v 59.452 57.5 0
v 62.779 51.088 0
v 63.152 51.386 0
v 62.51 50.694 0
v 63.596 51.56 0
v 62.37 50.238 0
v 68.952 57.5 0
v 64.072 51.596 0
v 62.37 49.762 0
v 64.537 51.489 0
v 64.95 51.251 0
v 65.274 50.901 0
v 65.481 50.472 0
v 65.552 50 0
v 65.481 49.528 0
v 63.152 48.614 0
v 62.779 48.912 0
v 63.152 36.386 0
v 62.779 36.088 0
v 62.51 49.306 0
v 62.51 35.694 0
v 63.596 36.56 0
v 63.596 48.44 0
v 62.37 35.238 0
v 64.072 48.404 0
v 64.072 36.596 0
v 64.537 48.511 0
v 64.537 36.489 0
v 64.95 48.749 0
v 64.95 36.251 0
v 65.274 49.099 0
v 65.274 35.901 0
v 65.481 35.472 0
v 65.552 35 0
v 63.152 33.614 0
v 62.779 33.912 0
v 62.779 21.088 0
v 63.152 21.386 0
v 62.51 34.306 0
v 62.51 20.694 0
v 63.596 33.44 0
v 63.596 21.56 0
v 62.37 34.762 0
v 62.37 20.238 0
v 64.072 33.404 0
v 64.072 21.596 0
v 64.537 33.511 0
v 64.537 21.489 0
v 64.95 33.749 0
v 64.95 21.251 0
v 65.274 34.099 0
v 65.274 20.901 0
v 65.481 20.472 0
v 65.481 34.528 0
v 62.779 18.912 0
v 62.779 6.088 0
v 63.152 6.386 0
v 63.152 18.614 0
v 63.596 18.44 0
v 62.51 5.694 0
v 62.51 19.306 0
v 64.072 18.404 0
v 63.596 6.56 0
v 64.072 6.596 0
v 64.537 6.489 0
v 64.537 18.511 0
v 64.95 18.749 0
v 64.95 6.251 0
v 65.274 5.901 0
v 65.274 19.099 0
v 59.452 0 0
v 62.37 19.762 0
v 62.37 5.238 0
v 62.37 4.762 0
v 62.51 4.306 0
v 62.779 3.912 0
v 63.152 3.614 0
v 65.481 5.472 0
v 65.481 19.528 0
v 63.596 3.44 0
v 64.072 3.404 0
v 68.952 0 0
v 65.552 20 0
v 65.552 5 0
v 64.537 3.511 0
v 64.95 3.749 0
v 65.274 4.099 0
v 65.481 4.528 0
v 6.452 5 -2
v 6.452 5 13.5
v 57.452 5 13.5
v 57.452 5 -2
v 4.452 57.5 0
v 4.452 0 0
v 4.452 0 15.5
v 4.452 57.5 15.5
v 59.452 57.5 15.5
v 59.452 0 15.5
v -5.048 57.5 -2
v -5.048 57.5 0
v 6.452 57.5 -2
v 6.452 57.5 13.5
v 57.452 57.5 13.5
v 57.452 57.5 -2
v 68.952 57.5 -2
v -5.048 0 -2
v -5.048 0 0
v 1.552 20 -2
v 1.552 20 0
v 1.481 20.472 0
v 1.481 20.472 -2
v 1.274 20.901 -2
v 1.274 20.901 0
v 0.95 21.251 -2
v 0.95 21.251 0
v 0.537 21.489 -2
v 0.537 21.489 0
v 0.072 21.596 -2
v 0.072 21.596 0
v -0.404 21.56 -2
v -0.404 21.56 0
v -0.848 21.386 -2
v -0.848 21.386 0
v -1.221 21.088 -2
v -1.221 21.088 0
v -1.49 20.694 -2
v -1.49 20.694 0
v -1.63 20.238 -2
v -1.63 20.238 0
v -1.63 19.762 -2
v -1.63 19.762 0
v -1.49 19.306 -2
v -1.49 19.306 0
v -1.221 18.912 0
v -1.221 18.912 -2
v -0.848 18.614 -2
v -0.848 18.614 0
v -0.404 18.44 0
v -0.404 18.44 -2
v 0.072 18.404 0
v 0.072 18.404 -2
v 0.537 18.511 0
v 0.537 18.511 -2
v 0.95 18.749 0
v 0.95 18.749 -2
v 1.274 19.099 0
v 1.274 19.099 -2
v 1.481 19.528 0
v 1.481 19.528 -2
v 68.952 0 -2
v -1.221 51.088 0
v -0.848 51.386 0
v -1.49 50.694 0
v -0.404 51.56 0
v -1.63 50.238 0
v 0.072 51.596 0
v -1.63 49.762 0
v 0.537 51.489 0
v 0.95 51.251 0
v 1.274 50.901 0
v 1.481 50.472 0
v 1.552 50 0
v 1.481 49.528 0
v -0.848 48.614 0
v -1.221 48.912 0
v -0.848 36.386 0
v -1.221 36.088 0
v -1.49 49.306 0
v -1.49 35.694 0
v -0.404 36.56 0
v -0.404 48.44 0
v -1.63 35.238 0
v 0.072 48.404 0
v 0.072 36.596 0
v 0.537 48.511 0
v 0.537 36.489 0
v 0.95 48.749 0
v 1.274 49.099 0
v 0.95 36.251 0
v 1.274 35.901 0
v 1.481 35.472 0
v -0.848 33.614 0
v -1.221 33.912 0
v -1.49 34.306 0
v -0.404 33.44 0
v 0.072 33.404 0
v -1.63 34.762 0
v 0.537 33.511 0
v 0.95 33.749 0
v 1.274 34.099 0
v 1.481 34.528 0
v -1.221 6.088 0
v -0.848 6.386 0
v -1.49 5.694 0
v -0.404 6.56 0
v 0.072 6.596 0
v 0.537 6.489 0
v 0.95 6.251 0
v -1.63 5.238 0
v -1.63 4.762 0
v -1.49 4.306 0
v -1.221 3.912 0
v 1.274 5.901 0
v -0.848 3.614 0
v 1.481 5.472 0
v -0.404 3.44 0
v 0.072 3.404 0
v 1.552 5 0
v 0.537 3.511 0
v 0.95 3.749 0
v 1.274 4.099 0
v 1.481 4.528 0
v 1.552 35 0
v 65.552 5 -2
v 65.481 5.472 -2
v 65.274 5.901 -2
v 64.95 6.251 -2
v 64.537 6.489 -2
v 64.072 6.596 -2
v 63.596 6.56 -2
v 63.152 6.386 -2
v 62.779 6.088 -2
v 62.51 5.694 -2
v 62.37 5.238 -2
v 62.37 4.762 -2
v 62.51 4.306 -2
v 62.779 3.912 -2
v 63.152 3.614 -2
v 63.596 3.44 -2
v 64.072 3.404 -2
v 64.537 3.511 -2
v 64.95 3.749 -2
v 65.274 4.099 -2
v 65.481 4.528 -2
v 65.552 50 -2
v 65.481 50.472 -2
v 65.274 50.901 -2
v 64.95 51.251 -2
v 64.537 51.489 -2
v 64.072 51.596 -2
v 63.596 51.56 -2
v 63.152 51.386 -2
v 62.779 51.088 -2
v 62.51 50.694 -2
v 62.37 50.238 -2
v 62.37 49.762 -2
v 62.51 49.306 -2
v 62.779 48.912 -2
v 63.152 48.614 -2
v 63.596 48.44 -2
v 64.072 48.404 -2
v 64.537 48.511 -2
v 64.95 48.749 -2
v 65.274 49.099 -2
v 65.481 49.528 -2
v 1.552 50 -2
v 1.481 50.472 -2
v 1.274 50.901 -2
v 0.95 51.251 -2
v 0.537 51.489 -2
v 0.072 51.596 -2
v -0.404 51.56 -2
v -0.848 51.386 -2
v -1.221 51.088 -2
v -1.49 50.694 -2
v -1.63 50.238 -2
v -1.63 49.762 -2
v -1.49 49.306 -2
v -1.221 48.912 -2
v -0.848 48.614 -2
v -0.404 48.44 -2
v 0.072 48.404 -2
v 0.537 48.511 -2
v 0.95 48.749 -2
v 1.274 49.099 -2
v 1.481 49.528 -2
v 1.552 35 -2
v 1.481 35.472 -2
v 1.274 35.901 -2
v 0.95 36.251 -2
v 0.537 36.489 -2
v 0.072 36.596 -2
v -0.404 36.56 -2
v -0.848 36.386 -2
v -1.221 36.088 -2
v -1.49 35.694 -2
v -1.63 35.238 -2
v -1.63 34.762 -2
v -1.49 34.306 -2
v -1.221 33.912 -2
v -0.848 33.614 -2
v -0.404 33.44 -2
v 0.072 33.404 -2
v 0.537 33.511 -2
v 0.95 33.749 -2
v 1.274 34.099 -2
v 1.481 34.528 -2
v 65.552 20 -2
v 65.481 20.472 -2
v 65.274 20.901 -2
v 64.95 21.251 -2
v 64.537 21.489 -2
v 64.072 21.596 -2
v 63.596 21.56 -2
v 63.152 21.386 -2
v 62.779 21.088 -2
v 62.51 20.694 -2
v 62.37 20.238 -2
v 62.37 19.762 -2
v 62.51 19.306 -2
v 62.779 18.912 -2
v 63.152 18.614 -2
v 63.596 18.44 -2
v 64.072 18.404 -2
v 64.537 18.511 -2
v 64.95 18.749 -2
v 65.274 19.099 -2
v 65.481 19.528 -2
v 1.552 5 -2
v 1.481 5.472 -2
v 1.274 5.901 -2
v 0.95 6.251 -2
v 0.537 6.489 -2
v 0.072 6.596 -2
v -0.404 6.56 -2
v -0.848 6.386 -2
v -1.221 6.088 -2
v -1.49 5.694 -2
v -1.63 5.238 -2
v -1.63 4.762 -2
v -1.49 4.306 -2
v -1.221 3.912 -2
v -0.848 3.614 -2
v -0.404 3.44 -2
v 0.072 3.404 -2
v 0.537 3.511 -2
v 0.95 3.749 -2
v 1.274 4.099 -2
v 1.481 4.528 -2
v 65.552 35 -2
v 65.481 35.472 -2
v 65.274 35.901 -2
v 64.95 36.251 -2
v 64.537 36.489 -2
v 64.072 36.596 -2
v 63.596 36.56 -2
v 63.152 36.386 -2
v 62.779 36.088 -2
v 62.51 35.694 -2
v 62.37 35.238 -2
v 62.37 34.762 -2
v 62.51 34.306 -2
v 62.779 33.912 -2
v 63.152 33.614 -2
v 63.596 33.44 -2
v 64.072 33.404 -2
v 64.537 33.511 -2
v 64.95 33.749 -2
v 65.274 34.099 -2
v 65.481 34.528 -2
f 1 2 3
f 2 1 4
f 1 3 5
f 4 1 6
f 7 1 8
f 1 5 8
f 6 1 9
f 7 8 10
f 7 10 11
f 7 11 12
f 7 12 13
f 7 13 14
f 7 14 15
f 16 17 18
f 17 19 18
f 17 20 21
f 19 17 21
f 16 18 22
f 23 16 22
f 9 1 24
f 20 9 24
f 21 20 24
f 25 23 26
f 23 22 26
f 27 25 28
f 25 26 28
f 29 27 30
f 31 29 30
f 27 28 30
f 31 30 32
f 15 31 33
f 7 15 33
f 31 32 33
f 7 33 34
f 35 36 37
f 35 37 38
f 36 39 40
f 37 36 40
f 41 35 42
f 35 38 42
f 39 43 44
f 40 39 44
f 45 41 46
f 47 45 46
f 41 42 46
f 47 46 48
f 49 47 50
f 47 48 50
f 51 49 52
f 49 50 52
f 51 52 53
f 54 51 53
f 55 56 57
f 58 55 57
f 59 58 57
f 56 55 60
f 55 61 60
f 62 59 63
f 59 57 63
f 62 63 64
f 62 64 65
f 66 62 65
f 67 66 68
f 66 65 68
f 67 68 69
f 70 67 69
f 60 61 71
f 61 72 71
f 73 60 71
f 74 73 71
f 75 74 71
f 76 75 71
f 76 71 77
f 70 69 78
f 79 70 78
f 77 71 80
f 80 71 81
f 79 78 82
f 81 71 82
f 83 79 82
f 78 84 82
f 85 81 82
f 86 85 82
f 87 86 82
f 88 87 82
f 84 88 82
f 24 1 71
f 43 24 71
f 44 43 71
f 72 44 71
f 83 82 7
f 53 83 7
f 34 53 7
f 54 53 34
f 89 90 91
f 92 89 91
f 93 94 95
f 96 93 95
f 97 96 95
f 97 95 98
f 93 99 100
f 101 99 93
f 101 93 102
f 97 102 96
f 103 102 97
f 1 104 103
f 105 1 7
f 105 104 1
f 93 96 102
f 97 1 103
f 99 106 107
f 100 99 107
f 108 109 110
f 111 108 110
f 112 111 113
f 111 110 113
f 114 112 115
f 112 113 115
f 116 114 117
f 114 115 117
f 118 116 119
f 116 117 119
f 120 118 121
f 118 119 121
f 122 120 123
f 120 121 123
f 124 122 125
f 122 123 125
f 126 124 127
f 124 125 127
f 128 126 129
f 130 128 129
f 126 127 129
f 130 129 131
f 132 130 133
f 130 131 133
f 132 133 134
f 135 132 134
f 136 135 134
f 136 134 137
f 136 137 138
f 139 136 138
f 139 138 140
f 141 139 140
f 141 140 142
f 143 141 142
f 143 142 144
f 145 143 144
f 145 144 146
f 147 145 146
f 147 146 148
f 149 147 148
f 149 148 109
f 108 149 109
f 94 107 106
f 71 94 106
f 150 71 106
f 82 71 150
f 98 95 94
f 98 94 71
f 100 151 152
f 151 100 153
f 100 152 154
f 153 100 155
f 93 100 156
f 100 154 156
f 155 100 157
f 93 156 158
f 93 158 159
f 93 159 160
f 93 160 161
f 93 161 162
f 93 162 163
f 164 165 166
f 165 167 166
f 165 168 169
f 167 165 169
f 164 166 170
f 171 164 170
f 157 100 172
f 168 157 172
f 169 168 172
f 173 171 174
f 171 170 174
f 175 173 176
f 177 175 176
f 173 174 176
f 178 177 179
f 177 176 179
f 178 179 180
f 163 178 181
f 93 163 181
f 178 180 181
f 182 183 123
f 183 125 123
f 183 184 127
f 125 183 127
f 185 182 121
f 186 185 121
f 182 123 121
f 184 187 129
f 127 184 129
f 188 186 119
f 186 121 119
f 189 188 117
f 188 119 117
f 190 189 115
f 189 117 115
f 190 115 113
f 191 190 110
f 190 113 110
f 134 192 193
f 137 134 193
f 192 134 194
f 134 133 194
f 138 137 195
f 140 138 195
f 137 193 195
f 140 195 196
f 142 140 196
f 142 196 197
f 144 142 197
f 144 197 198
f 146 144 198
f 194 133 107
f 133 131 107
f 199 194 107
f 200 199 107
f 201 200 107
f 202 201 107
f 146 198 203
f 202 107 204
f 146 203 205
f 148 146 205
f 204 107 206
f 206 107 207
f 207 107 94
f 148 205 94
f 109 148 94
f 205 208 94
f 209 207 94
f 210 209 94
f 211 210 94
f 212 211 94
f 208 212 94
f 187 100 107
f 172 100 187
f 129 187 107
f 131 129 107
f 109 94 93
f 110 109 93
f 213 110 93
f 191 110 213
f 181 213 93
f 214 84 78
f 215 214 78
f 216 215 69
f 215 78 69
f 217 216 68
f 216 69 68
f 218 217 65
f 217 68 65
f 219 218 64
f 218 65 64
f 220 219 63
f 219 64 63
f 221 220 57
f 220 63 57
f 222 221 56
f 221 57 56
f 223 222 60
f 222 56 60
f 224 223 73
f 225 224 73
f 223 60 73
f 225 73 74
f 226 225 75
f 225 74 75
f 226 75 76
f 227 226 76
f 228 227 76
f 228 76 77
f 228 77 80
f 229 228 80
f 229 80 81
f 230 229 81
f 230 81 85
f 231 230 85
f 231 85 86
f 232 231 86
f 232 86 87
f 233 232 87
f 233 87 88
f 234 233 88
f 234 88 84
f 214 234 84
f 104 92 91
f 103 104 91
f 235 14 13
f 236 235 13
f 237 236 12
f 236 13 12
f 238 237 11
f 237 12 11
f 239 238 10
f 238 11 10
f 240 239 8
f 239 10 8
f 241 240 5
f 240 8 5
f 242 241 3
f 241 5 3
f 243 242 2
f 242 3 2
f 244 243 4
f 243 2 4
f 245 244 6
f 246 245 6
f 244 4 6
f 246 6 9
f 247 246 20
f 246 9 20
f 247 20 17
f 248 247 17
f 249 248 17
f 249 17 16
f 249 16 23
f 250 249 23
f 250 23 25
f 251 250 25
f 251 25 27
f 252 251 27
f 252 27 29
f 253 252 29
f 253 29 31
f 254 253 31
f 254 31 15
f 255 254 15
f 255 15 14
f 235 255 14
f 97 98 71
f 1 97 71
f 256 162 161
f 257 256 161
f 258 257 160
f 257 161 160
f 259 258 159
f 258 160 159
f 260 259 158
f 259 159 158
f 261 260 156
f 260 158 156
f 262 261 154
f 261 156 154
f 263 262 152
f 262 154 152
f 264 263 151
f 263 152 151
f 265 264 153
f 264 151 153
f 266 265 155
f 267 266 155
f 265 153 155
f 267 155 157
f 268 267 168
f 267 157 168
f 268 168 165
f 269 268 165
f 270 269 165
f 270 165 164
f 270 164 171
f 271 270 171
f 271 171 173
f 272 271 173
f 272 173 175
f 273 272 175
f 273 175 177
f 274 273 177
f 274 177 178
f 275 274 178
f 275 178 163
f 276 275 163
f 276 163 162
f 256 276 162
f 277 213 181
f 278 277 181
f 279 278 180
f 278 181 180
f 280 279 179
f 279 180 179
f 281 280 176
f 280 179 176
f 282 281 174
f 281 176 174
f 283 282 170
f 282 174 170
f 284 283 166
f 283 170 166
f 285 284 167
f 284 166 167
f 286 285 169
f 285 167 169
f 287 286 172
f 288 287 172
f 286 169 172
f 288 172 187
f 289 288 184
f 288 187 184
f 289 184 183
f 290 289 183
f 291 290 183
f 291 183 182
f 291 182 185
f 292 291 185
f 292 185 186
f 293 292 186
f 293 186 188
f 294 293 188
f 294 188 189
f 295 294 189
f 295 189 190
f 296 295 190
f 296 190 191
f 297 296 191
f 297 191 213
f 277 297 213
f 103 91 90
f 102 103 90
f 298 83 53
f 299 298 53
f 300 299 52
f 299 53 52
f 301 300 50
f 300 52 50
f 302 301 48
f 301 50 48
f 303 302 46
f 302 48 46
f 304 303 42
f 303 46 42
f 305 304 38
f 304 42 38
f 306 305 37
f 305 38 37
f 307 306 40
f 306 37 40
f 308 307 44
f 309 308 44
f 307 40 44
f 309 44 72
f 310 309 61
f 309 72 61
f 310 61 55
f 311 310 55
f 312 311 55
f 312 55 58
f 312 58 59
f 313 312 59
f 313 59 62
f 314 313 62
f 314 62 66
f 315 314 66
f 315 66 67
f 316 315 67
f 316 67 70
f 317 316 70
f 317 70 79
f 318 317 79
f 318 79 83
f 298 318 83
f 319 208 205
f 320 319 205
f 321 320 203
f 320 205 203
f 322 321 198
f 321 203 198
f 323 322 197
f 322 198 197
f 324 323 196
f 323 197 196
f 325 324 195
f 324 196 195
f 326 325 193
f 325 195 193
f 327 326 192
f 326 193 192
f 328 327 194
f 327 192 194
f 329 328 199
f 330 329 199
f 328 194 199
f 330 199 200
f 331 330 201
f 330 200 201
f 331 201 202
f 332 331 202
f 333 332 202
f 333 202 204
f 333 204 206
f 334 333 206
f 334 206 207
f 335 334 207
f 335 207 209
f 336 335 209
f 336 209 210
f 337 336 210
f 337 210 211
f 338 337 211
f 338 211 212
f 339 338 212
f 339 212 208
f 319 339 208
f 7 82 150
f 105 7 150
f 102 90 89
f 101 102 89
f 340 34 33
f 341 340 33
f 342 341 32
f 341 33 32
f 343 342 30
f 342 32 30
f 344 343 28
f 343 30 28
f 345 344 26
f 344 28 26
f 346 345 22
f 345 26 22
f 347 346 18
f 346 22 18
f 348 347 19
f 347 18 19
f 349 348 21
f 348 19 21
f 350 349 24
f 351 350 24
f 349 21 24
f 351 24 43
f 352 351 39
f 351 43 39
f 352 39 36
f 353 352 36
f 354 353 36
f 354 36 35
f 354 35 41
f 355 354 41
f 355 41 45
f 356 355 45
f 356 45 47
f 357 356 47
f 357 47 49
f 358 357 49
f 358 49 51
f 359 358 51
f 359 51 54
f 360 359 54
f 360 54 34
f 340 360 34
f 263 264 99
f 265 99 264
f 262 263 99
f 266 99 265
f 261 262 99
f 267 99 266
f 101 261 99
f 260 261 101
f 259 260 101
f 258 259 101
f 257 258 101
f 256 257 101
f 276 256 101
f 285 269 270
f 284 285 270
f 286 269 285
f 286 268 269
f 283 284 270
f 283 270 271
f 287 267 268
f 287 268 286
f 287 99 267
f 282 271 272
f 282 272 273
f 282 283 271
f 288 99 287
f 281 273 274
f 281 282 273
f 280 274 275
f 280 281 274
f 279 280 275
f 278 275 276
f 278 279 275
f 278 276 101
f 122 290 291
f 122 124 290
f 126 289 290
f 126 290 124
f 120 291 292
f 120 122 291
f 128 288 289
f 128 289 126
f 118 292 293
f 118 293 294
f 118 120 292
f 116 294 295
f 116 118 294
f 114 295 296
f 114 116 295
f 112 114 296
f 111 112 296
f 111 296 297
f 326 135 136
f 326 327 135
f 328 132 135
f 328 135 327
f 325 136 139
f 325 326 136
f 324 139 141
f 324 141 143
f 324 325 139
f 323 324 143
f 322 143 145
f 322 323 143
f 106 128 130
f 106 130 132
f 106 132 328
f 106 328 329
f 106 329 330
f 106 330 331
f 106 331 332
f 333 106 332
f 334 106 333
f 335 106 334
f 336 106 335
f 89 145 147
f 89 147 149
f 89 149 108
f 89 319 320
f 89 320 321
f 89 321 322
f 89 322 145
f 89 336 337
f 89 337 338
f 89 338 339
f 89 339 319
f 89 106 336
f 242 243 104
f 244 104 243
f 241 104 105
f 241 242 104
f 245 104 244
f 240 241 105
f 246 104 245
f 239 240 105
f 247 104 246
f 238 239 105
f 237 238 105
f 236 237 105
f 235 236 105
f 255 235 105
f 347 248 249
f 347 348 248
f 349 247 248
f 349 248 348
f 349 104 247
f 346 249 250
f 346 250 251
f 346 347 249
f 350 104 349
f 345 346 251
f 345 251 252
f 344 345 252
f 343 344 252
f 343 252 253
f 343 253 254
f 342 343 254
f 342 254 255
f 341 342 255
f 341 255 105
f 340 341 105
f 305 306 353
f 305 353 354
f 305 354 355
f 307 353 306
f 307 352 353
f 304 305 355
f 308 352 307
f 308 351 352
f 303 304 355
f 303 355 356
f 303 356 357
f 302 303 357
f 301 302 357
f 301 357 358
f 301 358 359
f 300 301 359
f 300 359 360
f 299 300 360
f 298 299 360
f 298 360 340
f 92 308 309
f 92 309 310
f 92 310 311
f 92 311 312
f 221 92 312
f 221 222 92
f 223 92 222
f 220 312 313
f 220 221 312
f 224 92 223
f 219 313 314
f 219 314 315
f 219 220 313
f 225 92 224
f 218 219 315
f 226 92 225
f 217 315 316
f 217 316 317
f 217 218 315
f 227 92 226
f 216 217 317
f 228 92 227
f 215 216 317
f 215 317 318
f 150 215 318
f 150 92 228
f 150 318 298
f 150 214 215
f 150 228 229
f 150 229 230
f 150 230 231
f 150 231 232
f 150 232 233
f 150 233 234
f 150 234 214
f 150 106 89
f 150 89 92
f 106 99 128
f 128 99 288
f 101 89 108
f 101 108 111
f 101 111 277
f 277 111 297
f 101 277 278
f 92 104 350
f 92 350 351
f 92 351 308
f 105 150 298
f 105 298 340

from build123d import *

# Parameters (mm, degrees)
EXTRUDE_1_DEPTH     = 70
SKETCH_2_W          = 51
SKETCH_2_H          = 15.5
EXTRUDE_2_DEPTH     = 5
SKETCH_3_R          = 1.6
CUT_EXTRUDE_1_DEPTH = 17
SKETCH_4_W          = 196.862371893
SKETCH_4_H          = 80.94669897
CUT_EXTRUDE_2_DEPTH = 12.5


with BuildPart() as part:
    # 草图1 → 凸台-拉伸1 (new body)
    with BuildSketch(Plane(origin=(0, 0, 0), x_dir=(1, 0, 0), z_dir=(0, 1, 0))):
        Polygon((-5.048022599, 0), (4.451977401, 0), (4.451977401, -15.5), (59.451977401, -15.5), (59.451977401, 0), (68.951977401, 0), (68.951977401, 2), (57.451977401, 2), (57.451977401, -13.5), (6.451977401, -13.5), (6.451977401, 2), (-5.048022599, 2), align=None)
    extrude(amount=EXTRUDE_1_DEPTH)

    # 草图2 → 凸台-拉伸2 (add)
    with BuildSketch(Plane.XZ):
        with Locations((31.951977401, 5.75)):
            Rectangle(SKETCH_2_W, SKETCH_2_H)
    extrude(amount=-EXTRUDE_2_DEPTH)

    # 草图3 → 切除-拉伸1 (cut)
    with BuildSketch(Plane.XY):
        with Locations((-0.048022599, 35)):
            Circle(SKETCH_3_R)
        with Locations((-0.048022599, 20)):
            Circle(SKETCH_3_R)
        with Locations((-0.048022599, 5)):
            Circle(SKETCH_3_R)
        with Locations((-0.048022599, 65)):
            Circle(SKETCH_3_R)
        with Locations((-0.048022599, 50)):
            Circle(SKETCH_3_R)
        with Locations((63.951977401, 50)):
            Circle(SKETCH_3_R)
        with Locations((63.951977401, 65)):
            Circle(SKETCH_3_R)
        with Locations((63.951977401, 5)):
            Circle(SKETCH_3_R)
        with Locations((63.951977401, 20)):
            Circle(SKETCH_3_R)
        with Locations((63.951977401, 35)):
            Circle(SKETCH_3_R)
    extrude(amount=-CUT_EXTRUDE_1_DEPTH, mode=Mode.SUBTRACT)

    # 草图4 → 切除-拉伸2 (cut)
    with BuildSketch(Plane(origin=(0, 70, 0), x_dir=(1, 0, 0), z_dir=(0, 1, 0))):
        with Locations((-17.870085989, 16.997485689)):
            Rectangle(SKETCH_4_W, SKETCH_4_H)
    extrude(amount=-CUT_EXTRUDE_2_DEPTH, mode=Mode.SUBTRACT)


solid = part.part
